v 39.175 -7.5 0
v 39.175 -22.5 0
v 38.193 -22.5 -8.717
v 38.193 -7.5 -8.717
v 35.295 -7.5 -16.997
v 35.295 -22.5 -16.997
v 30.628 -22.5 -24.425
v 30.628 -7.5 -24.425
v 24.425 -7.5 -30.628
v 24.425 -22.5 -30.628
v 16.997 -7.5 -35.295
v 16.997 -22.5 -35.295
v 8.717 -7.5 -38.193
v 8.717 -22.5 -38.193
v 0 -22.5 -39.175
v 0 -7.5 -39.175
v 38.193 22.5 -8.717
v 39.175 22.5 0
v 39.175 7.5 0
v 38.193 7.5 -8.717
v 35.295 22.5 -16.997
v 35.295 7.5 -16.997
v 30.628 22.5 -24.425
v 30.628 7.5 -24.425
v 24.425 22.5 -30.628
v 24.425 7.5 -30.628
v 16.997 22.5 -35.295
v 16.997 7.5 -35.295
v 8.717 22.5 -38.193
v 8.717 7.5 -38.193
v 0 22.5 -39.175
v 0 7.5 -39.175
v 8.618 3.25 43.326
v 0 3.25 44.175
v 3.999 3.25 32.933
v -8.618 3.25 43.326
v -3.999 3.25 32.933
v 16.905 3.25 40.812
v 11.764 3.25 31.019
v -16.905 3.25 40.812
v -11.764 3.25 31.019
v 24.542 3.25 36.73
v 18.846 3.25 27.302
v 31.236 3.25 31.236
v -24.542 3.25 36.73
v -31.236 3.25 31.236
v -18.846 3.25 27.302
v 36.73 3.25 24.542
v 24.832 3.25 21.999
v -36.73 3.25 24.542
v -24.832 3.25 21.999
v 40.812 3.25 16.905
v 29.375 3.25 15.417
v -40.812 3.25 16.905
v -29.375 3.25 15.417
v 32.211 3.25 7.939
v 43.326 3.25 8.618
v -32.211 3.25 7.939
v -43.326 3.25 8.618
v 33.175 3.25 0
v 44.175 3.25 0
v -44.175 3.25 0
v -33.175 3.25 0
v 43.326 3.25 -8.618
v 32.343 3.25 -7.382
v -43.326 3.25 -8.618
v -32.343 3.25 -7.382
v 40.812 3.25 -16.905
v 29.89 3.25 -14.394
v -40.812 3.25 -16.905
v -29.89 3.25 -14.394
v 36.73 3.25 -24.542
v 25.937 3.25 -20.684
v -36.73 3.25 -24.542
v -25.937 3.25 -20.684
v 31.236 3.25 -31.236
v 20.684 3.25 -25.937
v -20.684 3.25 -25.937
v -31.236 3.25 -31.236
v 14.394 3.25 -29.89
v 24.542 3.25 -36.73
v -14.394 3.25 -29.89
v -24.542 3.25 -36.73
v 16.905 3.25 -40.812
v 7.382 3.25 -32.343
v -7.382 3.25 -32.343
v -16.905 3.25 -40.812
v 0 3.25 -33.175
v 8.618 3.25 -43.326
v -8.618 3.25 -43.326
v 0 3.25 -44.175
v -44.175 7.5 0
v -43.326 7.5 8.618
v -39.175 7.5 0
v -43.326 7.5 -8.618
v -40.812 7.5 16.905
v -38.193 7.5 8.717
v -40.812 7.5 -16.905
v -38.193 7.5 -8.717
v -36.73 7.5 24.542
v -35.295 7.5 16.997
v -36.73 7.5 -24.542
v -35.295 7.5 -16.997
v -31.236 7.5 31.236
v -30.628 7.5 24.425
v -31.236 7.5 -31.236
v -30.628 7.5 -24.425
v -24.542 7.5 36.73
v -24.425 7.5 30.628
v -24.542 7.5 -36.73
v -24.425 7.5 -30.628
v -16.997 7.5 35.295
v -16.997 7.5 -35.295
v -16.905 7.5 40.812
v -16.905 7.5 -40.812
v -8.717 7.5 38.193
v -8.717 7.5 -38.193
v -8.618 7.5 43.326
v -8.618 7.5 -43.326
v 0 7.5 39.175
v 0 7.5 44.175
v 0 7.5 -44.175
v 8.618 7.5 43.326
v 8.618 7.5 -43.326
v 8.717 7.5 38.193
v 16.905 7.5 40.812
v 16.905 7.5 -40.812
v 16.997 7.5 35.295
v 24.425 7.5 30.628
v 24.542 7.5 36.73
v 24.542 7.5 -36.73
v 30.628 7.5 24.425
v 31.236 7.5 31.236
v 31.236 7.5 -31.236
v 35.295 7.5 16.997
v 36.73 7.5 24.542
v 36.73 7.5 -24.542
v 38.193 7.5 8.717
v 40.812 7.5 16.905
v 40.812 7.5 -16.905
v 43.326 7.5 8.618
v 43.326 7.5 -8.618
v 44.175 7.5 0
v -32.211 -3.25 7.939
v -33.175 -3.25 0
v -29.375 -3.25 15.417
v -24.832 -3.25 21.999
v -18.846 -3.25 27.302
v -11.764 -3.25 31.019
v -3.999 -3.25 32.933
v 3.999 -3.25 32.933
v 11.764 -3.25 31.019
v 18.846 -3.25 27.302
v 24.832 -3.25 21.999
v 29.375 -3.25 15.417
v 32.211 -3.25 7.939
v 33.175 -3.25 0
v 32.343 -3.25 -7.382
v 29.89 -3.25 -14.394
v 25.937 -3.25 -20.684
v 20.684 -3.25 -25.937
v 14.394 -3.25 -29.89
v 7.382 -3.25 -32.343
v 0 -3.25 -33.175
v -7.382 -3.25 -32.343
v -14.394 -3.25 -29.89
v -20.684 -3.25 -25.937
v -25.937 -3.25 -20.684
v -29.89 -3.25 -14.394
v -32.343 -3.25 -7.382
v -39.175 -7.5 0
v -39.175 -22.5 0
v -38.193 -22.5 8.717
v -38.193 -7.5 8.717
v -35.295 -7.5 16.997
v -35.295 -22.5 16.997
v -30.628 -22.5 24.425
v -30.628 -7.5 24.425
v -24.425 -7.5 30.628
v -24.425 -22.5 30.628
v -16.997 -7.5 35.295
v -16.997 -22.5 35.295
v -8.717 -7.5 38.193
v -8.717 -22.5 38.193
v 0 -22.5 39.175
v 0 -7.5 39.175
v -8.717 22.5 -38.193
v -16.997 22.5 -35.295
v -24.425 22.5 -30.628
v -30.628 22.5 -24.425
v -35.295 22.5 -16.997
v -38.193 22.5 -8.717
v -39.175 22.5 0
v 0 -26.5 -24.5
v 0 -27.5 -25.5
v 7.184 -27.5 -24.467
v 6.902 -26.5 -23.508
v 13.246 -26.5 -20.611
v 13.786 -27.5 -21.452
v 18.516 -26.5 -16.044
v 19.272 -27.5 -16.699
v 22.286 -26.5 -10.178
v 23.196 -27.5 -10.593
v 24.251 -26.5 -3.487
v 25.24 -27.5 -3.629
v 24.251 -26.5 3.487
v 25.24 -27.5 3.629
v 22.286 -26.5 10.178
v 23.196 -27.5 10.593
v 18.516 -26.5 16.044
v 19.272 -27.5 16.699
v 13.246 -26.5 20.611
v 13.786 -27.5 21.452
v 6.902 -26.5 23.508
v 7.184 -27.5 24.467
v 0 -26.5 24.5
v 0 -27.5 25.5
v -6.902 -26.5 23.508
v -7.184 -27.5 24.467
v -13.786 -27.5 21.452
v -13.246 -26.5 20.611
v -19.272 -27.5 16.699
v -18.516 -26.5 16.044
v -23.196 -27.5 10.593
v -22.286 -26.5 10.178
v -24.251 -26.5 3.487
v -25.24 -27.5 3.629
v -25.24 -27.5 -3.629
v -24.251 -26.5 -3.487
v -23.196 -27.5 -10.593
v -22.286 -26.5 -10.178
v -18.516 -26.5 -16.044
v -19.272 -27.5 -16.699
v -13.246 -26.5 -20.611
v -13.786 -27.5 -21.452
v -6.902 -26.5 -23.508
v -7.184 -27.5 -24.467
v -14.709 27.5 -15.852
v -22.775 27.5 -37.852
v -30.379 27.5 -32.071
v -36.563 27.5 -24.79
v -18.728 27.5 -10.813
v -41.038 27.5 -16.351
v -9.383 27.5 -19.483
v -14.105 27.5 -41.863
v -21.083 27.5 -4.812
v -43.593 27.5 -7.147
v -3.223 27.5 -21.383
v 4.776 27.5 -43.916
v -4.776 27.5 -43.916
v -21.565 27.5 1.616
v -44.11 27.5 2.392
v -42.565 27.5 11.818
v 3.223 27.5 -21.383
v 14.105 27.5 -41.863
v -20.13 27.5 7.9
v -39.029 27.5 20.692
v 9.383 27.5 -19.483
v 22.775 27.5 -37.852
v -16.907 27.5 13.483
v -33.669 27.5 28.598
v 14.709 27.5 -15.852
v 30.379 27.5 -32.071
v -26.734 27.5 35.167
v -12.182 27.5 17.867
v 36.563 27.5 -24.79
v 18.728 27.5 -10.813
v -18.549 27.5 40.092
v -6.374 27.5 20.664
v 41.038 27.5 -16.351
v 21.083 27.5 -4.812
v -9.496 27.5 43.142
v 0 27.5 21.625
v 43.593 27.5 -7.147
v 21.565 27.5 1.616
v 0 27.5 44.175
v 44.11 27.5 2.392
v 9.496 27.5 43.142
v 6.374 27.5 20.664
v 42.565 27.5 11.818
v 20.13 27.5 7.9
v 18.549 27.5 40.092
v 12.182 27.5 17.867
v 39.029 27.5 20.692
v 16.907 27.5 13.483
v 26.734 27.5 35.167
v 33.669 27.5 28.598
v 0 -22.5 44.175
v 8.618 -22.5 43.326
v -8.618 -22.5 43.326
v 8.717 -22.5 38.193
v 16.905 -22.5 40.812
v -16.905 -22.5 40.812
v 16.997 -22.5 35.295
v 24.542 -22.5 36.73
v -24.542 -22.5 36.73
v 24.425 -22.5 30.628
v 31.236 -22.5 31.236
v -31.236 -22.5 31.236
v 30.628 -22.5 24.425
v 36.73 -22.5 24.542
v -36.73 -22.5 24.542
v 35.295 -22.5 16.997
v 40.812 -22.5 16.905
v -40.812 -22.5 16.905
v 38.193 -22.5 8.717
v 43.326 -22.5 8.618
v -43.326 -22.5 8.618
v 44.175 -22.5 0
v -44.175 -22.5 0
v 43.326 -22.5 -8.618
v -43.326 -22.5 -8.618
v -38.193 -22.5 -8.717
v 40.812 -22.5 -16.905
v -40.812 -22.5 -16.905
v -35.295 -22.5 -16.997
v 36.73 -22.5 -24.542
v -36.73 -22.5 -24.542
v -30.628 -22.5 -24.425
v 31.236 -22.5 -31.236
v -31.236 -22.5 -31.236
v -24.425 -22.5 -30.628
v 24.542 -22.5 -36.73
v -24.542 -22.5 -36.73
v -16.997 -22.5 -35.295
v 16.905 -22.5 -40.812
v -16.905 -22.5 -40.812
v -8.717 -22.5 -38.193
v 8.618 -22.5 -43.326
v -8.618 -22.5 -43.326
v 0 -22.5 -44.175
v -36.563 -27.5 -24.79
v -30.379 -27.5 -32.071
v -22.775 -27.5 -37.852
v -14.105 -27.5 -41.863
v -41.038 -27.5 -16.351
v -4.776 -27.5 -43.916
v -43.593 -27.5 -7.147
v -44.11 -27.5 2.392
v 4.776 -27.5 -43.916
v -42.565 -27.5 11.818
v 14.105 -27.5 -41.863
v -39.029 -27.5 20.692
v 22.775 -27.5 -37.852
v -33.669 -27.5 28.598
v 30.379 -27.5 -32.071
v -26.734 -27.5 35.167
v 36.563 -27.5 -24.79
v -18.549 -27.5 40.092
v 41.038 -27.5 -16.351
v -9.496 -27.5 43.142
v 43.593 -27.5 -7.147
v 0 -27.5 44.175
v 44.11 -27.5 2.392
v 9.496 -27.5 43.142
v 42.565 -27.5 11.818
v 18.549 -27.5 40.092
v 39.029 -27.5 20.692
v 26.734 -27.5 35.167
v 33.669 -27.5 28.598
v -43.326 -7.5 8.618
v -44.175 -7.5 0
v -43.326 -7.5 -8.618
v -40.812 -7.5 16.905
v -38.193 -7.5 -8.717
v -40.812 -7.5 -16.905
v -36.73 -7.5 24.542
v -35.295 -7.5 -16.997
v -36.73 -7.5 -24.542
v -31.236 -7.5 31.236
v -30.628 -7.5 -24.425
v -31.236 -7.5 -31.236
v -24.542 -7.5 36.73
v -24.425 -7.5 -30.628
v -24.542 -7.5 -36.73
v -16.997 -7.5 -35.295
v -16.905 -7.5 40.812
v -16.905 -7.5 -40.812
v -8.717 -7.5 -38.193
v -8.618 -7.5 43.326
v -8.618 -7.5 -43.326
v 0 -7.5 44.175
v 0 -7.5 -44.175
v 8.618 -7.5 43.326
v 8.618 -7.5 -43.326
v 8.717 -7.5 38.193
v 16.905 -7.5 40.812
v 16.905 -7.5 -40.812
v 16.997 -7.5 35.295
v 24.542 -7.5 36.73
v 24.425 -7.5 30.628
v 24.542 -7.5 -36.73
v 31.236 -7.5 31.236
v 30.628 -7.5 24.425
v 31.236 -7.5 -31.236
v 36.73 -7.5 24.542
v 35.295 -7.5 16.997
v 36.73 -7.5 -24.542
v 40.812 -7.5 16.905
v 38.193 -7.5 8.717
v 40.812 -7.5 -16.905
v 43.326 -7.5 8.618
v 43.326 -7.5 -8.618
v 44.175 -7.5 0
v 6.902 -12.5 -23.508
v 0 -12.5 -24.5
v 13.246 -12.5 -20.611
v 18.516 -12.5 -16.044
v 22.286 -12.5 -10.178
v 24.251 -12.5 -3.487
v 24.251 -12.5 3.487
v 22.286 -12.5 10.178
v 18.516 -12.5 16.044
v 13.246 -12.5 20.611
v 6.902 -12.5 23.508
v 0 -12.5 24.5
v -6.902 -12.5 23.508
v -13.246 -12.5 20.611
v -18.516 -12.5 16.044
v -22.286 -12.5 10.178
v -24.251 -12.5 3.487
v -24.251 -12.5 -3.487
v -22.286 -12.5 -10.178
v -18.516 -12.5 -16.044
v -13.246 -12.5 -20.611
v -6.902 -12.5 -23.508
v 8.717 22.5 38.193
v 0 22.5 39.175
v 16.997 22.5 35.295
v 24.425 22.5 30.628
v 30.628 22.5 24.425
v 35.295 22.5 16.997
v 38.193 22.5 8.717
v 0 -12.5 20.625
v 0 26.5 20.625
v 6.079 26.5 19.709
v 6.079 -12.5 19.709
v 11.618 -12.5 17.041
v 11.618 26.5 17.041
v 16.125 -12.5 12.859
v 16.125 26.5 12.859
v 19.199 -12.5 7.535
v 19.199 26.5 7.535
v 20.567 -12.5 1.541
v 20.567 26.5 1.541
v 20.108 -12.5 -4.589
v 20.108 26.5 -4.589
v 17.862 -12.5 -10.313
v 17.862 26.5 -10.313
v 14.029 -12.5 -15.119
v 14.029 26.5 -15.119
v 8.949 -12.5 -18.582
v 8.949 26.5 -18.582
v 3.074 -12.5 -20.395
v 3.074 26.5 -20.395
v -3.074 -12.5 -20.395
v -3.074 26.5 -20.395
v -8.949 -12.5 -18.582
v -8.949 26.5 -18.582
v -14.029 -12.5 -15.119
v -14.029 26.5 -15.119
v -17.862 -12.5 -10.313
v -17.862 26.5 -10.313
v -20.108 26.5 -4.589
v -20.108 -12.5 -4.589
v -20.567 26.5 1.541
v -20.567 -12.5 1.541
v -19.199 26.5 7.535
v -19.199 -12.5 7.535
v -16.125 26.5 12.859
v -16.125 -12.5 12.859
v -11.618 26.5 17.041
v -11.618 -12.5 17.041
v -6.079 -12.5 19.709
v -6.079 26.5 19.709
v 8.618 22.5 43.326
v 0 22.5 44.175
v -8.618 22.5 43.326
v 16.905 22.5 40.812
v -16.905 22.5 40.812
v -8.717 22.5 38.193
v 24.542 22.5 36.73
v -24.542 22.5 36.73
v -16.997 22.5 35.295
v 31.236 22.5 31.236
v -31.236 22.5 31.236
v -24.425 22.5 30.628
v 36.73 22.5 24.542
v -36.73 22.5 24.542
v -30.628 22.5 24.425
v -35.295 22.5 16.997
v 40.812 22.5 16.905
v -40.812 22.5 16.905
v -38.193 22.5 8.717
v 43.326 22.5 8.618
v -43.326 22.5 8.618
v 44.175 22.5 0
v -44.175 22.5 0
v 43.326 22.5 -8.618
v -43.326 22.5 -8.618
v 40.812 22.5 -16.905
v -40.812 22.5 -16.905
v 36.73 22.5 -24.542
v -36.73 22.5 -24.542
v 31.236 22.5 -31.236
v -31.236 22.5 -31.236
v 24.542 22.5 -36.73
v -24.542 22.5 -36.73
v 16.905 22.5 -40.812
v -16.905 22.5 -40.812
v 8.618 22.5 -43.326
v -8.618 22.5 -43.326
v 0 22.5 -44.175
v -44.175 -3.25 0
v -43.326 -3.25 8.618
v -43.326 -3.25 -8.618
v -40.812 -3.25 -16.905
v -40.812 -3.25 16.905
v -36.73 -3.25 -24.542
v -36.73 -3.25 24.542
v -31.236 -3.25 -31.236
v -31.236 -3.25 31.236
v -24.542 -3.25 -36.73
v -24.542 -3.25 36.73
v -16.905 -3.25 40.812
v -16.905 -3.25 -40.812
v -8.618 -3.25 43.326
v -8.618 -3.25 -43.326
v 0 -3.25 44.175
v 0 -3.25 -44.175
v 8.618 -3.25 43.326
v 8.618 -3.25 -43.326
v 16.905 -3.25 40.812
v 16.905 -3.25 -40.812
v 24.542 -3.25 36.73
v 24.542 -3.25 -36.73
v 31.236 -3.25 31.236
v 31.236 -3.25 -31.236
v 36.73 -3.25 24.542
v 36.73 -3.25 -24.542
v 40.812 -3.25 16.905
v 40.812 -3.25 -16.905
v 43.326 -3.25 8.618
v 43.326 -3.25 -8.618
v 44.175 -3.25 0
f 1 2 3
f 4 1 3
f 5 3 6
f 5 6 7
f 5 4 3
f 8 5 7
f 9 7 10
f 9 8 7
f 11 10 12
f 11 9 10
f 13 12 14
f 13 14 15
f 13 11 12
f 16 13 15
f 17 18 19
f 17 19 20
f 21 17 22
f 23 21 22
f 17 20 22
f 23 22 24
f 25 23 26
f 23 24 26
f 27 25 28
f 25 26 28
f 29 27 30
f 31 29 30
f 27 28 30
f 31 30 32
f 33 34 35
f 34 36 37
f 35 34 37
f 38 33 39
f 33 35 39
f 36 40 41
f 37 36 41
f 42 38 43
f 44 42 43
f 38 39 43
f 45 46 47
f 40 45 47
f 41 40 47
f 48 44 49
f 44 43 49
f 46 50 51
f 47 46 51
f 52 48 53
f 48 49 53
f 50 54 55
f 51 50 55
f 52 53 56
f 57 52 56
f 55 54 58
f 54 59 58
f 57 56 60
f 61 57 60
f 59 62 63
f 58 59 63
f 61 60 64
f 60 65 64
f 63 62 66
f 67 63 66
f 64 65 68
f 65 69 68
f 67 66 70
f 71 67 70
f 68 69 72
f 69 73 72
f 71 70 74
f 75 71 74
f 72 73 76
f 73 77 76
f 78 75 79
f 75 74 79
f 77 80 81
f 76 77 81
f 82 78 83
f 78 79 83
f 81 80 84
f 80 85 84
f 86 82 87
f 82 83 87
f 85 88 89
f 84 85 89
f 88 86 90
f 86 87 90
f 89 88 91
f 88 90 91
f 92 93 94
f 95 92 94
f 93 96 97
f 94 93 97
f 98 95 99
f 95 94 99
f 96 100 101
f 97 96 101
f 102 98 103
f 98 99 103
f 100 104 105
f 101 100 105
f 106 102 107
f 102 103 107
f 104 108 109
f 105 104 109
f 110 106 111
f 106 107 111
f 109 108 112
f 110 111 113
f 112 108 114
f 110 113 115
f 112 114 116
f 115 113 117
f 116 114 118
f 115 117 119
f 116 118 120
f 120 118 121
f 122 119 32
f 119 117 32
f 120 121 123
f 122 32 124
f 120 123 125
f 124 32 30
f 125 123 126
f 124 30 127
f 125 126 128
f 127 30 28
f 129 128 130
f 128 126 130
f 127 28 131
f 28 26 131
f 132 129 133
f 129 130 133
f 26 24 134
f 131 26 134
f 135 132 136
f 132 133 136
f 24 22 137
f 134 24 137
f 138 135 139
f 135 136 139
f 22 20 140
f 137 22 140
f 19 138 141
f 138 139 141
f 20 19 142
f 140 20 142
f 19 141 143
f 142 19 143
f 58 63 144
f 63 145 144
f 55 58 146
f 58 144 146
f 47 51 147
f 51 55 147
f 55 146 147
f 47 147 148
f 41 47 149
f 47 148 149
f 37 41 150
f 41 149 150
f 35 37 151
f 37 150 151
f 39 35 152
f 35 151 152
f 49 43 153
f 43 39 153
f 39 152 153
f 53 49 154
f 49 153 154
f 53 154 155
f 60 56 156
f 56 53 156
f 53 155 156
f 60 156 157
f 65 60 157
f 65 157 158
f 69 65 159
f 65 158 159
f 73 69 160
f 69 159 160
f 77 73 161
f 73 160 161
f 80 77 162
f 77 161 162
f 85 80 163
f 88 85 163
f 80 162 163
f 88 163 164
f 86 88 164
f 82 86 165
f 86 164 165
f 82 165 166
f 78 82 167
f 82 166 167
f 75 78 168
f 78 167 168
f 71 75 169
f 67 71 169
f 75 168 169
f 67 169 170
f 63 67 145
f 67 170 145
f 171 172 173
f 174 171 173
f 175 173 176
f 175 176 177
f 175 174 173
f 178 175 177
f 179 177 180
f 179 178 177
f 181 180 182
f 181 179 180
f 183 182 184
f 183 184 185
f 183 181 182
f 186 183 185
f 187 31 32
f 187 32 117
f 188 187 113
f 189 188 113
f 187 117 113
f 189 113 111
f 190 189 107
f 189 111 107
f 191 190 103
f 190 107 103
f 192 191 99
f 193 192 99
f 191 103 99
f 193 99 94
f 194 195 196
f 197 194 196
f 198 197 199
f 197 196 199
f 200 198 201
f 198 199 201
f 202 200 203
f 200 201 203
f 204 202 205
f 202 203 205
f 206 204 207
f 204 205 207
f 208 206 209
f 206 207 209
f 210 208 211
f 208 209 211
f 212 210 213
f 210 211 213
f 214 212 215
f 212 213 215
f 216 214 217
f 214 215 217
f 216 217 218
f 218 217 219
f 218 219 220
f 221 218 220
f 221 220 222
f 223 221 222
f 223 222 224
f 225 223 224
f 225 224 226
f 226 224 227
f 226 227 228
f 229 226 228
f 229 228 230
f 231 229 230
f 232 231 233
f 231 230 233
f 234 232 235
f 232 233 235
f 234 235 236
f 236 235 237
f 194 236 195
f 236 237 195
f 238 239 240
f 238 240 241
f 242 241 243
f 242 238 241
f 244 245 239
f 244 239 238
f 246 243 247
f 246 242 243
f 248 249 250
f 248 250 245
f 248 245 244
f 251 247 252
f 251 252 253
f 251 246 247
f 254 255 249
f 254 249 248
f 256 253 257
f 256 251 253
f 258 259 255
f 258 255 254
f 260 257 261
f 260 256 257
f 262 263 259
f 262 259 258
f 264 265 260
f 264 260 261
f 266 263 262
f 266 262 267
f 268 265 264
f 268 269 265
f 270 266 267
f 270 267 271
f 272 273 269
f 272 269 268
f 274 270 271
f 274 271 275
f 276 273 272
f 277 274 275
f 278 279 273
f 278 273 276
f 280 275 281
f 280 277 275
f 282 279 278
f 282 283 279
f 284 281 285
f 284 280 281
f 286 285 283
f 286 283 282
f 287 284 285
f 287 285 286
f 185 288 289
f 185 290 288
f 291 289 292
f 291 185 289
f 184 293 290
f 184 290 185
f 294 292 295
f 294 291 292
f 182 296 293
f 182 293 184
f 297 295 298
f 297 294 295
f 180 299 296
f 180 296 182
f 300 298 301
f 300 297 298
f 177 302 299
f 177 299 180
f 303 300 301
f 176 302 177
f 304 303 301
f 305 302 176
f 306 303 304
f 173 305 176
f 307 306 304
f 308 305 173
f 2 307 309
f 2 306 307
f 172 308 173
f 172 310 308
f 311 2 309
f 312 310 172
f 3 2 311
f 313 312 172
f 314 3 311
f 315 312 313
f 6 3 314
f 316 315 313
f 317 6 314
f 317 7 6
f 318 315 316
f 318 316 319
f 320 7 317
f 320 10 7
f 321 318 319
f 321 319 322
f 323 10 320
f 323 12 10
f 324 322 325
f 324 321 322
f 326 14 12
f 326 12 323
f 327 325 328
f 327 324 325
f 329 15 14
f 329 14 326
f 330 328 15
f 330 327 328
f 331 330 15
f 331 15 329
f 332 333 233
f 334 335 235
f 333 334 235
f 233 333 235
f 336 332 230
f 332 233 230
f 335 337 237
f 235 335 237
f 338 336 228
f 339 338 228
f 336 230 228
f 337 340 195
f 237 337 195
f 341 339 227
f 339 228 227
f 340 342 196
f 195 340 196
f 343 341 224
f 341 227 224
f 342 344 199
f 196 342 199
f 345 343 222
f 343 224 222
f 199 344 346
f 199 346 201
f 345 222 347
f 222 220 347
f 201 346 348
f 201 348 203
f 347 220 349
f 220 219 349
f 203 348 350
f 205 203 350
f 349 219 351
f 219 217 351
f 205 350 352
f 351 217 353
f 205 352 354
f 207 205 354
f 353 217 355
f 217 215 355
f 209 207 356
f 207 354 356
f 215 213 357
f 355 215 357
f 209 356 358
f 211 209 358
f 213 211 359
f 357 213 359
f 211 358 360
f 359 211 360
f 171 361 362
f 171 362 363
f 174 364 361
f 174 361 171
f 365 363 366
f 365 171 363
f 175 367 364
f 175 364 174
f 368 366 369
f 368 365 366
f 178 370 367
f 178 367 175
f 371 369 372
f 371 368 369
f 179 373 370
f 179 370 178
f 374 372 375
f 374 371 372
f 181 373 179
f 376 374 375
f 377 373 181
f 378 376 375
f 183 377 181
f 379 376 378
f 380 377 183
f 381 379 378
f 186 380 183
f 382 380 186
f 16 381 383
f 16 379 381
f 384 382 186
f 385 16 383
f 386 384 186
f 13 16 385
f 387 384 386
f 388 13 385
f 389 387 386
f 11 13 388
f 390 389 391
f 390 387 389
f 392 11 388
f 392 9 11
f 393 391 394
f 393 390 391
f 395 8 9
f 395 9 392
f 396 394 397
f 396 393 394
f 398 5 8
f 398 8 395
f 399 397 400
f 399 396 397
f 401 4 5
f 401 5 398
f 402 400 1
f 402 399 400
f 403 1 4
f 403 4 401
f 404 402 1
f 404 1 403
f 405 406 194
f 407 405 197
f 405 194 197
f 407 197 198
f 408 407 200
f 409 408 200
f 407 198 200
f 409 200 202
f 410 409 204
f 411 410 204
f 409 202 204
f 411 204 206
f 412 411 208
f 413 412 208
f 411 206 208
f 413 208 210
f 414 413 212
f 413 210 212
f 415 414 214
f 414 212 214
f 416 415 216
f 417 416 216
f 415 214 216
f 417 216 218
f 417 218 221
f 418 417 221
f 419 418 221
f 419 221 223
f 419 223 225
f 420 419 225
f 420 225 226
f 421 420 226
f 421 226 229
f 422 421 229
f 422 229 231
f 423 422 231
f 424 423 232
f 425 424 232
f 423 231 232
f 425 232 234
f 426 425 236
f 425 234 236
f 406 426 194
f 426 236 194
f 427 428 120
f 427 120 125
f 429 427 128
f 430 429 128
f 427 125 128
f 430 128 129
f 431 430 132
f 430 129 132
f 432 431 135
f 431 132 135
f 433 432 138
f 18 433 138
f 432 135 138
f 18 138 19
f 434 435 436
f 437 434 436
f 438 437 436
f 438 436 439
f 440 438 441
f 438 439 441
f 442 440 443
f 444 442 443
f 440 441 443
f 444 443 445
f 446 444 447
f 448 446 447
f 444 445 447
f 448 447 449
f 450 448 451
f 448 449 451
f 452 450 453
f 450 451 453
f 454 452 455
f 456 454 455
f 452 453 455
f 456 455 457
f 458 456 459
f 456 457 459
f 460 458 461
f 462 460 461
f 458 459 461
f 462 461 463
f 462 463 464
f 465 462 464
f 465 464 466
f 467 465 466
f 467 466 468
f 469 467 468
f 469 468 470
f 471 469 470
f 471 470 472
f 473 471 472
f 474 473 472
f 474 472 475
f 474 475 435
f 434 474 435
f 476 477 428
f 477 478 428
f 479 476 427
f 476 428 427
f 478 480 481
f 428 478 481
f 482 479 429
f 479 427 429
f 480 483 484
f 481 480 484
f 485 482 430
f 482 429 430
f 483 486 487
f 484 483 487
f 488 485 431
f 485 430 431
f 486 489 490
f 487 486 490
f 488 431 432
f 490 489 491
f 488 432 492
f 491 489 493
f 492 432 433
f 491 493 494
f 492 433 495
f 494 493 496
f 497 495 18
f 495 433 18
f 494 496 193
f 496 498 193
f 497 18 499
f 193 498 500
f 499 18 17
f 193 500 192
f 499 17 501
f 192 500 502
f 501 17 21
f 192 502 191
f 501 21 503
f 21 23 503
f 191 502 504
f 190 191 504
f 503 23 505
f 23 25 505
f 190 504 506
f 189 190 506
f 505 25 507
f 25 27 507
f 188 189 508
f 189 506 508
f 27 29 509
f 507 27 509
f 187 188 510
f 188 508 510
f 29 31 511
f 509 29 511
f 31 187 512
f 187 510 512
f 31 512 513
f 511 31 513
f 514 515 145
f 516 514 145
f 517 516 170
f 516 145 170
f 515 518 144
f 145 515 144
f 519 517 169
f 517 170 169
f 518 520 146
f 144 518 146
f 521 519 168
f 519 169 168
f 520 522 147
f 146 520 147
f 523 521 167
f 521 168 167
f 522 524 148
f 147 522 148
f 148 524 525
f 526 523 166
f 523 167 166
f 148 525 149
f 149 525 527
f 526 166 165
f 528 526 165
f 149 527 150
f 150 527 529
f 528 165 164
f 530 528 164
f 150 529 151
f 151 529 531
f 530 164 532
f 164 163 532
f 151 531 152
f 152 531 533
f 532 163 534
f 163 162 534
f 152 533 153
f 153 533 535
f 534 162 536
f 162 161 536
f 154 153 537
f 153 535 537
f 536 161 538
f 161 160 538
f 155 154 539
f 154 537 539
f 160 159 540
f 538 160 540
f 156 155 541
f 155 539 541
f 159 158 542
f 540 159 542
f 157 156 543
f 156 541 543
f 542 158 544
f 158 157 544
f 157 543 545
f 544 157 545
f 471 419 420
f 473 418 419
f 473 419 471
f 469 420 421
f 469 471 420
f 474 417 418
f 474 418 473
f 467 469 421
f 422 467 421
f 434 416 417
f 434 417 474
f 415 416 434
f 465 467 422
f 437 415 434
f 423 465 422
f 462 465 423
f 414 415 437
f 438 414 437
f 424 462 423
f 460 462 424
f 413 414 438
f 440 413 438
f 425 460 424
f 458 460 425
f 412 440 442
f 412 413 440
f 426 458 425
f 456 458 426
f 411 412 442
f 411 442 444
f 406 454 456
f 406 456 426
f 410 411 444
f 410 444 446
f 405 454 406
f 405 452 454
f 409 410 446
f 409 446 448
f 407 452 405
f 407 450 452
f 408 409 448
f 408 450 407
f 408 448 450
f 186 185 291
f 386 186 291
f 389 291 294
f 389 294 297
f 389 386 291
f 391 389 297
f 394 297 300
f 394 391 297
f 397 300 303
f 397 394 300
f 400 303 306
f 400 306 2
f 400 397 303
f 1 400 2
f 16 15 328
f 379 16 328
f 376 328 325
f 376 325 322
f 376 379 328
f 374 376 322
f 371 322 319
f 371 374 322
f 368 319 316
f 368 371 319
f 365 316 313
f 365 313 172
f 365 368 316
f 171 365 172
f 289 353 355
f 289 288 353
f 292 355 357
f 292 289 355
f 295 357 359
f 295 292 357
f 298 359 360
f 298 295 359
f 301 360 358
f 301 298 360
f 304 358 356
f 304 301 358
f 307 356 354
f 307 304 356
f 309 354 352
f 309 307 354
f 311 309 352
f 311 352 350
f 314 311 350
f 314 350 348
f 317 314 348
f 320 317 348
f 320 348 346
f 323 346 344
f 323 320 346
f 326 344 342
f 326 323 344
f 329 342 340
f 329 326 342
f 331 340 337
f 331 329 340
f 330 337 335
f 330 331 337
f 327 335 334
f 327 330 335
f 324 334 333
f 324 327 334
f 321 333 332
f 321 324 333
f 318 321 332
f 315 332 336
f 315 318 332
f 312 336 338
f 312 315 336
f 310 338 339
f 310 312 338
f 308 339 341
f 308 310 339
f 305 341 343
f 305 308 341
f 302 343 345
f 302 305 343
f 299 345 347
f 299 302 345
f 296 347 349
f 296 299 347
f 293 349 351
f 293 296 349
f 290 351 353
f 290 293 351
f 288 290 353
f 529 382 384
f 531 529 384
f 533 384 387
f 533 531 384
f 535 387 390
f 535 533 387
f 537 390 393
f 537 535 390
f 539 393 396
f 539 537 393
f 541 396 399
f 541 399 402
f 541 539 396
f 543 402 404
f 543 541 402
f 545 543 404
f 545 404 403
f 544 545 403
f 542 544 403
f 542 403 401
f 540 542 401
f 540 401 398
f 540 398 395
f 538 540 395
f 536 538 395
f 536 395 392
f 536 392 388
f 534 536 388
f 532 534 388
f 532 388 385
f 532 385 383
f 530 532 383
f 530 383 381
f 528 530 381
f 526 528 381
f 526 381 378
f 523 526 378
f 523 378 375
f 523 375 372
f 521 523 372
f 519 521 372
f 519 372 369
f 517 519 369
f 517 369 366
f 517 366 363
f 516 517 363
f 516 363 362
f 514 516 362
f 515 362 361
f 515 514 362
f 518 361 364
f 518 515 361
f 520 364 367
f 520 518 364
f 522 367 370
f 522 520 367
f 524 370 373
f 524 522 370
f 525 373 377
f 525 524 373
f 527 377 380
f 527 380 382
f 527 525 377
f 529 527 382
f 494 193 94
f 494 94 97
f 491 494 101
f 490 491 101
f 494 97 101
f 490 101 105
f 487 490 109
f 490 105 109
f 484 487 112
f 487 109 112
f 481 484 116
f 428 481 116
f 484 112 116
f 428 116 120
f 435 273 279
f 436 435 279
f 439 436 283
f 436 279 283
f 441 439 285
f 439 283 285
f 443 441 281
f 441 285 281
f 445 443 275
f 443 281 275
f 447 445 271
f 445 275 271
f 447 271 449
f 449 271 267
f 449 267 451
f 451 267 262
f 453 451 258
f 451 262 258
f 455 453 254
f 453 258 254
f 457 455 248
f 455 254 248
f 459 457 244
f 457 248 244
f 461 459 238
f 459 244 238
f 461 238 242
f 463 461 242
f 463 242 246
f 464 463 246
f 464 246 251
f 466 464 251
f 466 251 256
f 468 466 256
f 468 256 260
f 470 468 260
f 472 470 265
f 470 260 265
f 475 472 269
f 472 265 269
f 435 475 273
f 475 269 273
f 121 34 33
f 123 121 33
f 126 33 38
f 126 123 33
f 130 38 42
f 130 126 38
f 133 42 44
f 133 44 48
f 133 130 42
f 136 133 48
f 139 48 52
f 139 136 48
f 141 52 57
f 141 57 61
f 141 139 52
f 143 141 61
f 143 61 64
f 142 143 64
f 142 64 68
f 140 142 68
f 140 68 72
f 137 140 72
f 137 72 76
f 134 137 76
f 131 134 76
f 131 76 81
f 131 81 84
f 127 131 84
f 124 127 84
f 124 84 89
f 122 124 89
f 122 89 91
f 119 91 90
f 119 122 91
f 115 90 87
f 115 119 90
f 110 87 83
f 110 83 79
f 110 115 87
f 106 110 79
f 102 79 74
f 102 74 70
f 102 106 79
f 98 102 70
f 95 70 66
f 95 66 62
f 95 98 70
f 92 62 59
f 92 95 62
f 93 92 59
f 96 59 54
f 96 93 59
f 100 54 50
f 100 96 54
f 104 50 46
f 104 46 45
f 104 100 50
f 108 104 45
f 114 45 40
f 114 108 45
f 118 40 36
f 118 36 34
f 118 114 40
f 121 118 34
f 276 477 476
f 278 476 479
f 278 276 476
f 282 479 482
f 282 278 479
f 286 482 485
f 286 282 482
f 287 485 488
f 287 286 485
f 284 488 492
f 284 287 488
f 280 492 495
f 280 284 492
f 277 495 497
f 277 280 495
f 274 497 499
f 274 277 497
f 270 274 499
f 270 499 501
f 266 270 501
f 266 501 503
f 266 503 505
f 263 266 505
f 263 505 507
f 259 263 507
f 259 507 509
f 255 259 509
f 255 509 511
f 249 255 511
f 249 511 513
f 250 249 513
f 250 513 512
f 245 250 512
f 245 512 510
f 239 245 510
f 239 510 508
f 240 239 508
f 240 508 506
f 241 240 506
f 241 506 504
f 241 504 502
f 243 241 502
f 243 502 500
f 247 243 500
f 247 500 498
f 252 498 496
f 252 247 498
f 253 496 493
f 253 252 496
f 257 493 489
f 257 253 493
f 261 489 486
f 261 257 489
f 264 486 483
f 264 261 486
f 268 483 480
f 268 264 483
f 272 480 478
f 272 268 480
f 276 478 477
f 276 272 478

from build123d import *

# Parameters (mm, degrees)
SKETCH1_R           = 44.175
BOSS_EXTRUDE1_DEPTH = 27.5
SKETCH3_W           = 11
SKETCH3_H           = 6.5
SKETCH4_W           = 5
SKETCH4_H           = 15
SKETCH9_R           = 20.625
CUT_EXTRUDE2_DEPTH  = 84.233774695
CHAMFER1_SIZE       = 1
SKETCH10_R          = 24.5
CUT_EXTRUDE3_DEPTH  = 15
CHAMFER2_SIZE       = 1


with BuildPart() as part:
    # Sketch1 → Boss-Extrude1 (new, symmetric)
    with BuildSketch(Plane(origin=(0, 0, 0), x_dir=(1, 0, 0), z_dir=(0, 1, 0))):
        with Locations(Location((0, 0, 0), (0, 0, 270))):
            Circle(SKETCH1_R)
    extrude(amount=BOSS_EXTRUDE1_DEPTH, both=True)

    # Cut-Sweep1: sweep along a curve in space
    with BuildLine() as cut_sweep1_path:
        ThreePointArc((0, 27.5, 44.175), (31.236442059, 27.5, 31.236442059), (44.175, 27.5, 0))
        ThreePointArc((44.175, 27.5, 0), (31.236442059, 27.5, -31.236442059), (0, 27.5, -44.175))
        ThreePointArc((0, 27.5, -44.175), (-31.236442059, 27.5, -31.236442059), (-44.175, 27.5, 0))
        ThreePointArc((-44.175, 27.5, 0), (-31.236442059, 27.5, 31.236442059), (0, 27.5, 44.175))
    # Sketch3 → Cut-Sweep1 (sweep, cut)
    with BuildSketch(Plane.XY):
        with Locations((38.675, 0)):
            Rectangle(SKETCH3_W, SKETCH3_H)
    sweep(path=cut_sweep1_path.line, mode=Mode.SUBTRACT)

    # Cut-Sweep2: sweep along a curve in space
    with BuildLine() as cut_sweep2_path:
        ThreePointArc((0, 27.5, 44.175), (31.236442059, 27.5, 31.236442059), (44.175, 27.5, 0))
        ThreePointArc((44.175, 27.5, 0), (31.236442059, 27.5, -31.236442059), (0, 27.5, -44.175))
        ThreePointArc((0, 27.5, -44.175), (-31.236442059, 27.5, -31.236442059), (-44.175, 27.5, 0))
        ThreePointArc((-44.175, 27.5, 0), (-31.236442059, 27.5, 31.236442059), (0, 27.5, 44.175))
    # Sketch4 → Cut-Sweep2 (sweep, cut)
    with BuildSketch(Plane.XY):
        with Locations((41.675, 15)):
            Rectangle(SKETCH4_W, SKETCH4_H)
    cut_sweep2 = sweep(path=cut_sweep2_path.line, mode=Mode.SUBTRACT)

    # Mirror1: Cut-Sweep2 across plane
    add(cut_sweep2.mirror(Plane.ZX), mode=Mode.SUBTRACT)

    # Sketch9 → Cut-Extrude2 (cut, through all)
    with BuildSketch(Plane(origin=(0, 27.5, 0), x_dir=(1, 0, 0), z_dir=(0, 1, 0))):
        with Locations(Location((0, 0, 0), (0, 0, 270))):
            Circle(SKETCH9_R)
    extrude(amount=-CUT_EXTRUDE2_DEPTH, mode=Mode.SUBTRACT)

    # Chamfer1
    chamfer1_edges = [part.edges().sort_by_distance(p)[0] for p in [
        (0, 27.5, -20.625),
    ]]
    chamfer(chamfer1_edges, length=CHAMFER1_SIZE)

    # Sketch10 → Cut-Extrude3 (cut)
    with BuildSketch(Plane.XZ.offset(27.5)):
        with Locations(Location((0, 0, 0), (0, 0, 270))):
            Circle(SKETCH10_R)
    extrude(amount=-CUT_EXTRUDE3_DEPTH, mode=Mode.SUBTRACT)

    # Chamfer2
    chamfer2_edges = [part.edges().sort_by_distance(p)[0] for p in [
        (0, -27.5, 24.5),
    ]]
    chamfer(chamfer2_edges, length=CHAMFER2_SIZE)


solid = part.part
